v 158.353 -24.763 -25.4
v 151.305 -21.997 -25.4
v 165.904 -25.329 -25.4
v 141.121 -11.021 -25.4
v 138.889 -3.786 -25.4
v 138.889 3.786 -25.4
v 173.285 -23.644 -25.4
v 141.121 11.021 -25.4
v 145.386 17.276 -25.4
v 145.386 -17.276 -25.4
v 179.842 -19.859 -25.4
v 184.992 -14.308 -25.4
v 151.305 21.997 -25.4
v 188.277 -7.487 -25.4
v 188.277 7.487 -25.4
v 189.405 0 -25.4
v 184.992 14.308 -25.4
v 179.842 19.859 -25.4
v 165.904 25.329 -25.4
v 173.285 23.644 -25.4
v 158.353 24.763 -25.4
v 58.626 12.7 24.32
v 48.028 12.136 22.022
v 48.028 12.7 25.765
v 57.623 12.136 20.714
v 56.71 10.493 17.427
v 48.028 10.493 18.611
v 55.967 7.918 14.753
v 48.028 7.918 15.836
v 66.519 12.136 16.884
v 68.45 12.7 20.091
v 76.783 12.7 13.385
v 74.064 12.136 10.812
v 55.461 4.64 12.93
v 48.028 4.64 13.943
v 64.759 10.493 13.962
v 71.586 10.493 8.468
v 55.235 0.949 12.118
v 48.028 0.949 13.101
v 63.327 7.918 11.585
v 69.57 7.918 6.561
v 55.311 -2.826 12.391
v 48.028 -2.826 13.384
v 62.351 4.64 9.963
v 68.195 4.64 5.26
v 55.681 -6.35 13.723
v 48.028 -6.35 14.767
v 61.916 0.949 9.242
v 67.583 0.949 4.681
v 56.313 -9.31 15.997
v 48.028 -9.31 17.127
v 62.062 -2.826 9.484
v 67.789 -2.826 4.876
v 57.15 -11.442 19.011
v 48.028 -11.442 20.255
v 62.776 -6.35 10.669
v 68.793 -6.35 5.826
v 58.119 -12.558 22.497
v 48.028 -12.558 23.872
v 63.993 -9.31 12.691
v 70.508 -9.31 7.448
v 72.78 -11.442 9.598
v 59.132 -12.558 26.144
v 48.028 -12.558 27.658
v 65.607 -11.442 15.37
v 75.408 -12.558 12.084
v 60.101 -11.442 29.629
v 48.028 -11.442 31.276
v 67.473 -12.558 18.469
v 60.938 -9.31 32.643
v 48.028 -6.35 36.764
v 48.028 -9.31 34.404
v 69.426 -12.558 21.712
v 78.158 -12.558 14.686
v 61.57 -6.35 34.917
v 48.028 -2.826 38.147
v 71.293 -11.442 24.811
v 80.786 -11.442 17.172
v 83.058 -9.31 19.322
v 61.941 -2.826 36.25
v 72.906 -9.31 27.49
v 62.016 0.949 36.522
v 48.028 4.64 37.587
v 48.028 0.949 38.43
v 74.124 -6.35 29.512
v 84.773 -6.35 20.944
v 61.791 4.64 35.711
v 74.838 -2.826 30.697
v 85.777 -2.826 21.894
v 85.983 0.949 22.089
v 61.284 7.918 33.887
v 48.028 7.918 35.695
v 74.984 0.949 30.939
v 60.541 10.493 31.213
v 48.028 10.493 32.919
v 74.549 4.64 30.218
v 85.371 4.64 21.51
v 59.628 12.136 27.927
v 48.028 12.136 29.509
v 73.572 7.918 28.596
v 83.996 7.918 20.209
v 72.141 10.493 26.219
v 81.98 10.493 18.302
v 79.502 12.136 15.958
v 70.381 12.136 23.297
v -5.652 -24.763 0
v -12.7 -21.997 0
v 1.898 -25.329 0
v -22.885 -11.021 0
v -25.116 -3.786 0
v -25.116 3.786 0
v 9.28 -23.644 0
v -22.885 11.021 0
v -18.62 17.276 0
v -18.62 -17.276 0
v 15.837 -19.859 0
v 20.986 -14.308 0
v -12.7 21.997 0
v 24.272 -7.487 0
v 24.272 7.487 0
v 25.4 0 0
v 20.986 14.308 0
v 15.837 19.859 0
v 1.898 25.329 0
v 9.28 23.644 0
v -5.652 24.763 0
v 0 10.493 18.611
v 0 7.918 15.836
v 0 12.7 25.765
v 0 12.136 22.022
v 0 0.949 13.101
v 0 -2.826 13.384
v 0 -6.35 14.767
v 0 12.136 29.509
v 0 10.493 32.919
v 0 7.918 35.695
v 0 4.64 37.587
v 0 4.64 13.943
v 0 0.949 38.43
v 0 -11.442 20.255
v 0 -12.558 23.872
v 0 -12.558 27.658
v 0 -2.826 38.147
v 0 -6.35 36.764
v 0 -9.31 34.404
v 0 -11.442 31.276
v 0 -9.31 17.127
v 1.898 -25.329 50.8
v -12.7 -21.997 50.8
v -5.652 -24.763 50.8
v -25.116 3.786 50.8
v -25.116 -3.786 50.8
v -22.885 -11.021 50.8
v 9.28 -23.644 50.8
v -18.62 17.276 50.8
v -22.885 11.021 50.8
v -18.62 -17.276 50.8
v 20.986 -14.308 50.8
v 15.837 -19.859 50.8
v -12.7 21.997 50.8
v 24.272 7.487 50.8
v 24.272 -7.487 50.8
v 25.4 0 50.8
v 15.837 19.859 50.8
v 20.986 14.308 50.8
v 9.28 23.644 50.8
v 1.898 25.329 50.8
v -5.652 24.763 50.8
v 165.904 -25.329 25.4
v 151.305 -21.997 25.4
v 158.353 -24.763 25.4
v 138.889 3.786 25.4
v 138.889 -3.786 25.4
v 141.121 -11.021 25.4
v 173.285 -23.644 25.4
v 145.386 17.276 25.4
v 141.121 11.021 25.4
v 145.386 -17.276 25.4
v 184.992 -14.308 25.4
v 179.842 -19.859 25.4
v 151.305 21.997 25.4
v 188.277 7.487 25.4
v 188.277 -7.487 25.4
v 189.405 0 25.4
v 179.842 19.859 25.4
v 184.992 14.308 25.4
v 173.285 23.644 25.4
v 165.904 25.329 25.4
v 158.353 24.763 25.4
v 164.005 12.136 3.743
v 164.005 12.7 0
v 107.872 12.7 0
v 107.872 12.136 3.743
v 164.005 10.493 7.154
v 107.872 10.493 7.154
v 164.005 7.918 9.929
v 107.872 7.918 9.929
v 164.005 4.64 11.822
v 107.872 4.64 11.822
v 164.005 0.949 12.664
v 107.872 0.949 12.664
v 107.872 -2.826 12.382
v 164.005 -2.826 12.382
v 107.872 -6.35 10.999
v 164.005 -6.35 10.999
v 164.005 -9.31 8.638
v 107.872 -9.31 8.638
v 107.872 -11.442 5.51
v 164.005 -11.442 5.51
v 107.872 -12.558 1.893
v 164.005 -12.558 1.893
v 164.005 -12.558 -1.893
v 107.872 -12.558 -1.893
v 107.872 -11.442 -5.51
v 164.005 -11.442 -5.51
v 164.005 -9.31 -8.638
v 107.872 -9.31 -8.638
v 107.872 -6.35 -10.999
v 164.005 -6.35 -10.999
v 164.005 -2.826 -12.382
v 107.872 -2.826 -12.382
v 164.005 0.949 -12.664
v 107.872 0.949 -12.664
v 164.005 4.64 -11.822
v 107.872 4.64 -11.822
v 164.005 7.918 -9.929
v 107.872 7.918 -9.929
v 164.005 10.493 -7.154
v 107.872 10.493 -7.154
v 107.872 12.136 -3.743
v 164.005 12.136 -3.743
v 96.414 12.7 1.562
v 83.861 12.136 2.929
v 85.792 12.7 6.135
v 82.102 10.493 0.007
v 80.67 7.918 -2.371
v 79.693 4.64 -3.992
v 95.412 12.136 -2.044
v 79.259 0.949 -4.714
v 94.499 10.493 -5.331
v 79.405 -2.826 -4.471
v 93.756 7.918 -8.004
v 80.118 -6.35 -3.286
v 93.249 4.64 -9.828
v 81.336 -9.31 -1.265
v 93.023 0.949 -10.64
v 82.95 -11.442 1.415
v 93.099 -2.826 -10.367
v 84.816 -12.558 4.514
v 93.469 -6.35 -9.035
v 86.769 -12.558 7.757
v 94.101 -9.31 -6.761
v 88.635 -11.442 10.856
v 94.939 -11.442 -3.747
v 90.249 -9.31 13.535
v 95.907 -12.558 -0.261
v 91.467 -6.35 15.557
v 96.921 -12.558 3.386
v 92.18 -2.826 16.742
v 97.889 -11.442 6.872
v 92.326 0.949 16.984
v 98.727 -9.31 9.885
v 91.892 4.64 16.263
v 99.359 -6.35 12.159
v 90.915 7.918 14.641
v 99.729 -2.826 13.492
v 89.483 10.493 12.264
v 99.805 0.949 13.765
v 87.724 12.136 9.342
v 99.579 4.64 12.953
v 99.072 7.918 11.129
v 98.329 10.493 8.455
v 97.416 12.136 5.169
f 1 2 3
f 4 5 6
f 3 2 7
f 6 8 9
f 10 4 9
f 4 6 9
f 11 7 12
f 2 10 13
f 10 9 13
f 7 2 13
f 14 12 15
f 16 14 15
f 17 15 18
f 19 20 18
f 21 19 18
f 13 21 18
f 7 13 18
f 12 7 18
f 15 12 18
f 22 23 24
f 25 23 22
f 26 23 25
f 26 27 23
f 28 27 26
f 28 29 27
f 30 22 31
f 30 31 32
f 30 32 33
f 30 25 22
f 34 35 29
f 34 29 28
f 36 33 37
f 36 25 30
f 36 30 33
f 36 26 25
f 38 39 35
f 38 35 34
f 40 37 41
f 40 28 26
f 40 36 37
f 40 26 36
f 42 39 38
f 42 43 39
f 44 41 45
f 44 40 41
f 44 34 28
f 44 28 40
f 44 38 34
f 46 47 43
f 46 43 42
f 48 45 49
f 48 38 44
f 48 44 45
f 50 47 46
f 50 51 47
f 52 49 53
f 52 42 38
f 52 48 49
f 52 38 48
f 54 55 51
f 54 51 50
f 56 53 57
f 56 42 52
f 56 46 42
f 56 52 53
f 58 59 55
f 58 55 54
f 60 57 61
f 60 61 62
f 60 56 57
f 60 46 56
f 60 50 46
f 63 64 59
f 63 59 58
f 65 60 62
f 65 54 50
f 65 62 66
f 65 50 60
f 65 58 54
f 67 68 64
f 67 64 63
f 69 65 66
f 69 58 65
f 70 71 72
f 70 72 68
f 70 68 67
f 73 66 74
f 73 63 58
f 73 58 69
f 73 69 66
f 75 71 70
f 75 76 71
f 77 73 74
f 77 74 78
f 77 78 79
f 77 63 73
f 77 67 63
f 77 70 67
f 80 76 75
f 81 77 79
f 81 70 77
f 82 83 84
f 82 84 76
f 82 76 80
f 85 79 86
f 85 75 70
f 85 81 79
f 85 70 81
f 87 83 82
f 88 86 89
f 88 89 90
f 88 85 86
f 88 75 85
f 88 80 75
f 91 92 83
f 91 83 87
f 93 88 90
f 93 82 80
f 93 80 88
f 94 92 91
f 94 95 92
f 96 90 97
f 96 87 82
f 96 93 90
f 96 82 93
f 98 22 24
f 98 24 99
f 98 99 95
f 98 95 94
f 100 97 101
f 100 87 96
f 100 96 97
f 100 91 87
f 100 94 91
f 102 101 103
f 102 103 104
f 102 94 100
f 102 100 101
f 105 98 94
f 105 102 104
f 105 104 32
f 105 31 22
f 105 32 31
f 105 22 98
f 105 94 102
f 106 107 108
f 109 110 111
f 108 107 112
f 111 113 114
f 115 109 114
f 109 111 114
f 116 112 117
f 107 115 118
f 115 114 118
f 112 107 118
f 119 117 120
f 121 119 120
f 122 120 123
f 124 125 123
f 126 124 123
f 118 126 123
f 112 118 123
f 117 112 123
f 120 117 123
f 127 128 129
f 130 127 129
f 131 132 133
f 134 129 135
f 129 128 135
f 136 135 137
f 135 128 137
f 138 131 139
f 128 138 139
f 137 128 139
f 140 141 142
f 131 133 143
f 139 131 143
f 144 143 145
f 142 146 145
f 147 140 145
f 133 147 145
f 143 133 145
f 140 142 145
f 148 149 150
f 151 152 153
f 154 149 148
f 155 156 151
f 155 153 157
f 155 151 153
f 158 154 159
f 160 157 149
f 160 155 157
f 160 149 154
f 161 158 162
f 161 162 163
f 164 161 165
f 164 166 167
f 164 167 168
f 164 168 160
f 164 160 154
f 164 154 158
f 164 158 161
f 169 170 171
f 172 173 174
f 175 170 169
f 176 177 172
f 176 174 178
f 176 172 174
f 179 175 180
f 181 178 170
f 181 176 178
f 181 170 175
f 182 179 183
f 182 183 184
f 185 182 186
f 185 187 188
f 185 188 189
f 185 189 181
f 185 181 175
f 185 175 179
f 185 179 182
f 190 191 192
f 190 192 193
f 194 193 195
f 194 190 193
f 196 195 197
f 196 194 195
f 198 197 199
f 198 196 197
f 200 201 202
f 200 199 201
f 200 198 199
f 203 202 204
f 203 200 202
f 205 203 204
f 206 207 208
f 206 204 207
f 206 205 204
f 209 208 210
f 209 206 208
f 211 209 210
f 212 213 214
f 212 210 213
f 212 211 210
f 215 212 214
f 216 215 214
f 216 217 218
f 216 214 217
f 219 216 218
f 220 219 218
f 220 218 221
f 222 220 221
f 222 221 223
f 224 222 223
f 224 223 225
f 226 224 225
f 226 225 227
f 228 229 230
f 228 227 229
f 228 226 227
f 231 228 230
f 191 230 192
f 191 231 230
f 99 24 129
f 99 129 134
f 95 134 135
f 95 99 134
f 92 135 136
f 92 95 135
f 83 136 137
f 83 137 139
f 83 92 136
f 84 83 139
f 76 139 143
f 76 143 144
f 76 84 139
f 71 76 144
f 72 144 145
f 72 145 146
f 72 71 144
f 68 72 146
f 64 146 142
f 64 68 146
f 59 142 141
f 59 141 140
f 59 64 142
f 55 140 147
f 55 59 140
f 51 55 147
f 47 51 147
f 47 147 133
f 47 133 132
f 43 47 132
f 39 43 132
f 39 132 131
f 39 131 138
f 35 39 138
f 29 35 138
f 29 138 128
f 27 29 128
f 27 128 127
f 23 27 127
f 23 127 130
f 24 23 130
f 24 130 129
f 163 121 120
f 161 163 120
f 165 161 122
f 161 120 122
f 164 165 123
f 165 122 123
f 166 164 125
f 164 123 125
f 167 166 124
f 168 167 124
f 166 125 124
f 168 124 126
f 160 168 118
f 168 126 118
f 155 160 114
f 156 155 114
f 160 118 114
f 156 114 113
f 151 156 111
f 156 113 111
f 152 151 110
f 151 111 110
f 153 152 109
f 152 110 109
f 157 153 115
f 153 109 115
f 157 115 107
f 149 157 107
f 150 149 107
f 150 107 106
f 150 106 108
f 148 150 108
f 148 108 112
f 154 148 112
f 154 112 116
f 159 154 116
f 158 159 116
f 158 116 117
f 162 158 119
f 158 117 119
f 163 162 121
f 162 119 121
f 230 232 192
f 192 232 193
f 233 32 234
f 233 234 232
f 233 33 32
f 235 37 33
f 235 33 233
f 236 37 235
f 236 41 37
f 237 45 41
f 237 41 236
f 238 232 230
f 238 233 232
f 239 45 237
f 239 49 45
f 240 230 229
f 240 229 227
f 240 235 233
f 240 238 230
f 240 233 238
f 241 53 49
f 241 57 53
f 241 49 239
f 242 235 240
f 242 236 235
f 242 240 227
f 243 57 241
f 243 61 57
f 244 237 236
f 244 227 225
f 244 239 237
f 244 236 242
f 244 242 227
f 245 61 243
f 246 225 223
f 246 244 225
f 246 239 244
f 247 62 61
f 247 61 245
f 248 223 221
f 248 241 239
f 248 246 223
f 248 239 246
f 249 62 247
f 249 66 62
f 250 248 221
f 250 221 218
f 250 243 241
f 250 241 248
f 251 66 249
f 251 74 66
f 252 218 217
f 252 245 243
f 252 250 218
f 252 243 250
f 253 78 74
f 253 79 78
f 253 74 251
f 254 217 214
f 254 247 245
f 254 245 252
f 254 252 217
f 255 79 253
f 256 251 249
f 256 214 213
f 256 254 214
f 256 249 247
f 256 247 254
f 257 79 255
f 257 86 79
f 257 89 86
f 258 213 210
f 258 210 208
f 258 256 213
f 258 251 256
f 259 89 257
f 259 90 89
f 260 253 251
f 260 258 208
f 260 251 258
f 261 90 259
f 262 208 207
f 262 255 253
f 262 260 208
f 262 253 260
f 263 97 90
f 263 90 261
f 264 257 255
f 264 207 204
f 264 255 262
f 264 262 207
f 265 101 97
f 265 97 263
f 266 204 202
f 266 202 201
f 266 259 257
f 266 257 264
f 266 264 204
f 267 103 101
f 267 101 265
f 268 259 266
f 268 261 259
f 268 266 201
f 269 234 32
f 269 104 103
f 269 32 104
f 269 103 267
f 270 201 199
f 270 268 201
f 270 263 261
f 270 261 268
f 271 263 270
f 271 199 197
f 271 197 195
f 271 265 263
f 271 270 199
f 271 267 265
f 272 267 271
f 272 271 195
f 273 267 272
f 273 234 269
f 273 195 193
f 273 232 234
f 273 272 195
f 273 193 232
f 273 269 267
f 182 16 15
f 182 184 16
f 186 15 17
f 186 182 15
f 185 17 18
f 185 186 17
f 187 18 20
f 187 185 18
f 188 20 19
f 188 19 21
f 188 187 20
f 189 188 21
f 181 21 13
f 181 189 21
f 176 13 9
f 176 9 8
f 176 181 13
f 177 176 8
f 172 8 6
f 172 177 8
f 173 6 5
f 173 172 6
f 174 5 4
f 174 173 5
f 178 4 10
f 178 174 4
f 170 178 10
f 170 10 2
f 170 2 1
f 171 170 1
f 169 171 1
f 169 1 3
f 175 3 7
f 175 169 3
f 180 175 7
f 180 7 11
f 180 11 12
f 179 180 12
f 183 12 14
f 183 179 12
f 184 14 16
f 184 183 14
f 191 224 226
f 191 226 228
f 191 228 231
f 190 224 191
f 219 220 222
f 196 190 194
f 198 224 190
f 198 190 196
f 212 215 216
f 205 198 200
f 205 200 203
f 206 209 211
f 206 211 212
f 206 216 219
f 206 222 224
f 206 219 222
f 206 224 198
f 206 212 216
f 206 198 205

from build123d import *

# Parameters (mm, degrees)
F0_R     = 25.4
F1_DEPTH = 50.8
F2_DEPTH = 25.4
F4_R     = 12.7


with BuildPart() as f1:
    # F0 (on Top) → F1 (new body)
    with BuildSketch(Plane.XY):
        Circle(F0_R)
    extrude(amount=F1_DEPTH)


with BuildPart() as f2:
    # F0 (on Top) → F2 (new body, symmetric)
    with BuildSketch(Plane.XY):
        with Locations((164.0053569386, 0)):
            Circle(F0_R)
    extrude(amount=F2_DEPTH, both=True)


with BuildPart() as f5:
    # F5: sweep along a path in F3
    with BuildLine(Plane.XZ) as f5_path:
        Line((0, 25.7653268045), (48.0276979506, 25.7653268045))
        ThreePointArc((48.0276979506, 25.7653268045), (63.6812827633, 22.5387563608), (76.7830014229, 13.3850444099))
        ThreePointArc((76.7830014229, 13.3850444099), (90.9480326003, 3.4884332443), (107.8720349141, 0))
        Line((107.8720349141, 0), (164.0053569386, 0))
    # F4 (on Right) → F5 (sweep)
    with BuildSketch(Plane.YZ):
        with Locations((0, 25.7653268045)):
            Circle(F4_R)
    sweep(path=f5_path.line)


solid = Compound([f1.part, f2.part, f5.part])
